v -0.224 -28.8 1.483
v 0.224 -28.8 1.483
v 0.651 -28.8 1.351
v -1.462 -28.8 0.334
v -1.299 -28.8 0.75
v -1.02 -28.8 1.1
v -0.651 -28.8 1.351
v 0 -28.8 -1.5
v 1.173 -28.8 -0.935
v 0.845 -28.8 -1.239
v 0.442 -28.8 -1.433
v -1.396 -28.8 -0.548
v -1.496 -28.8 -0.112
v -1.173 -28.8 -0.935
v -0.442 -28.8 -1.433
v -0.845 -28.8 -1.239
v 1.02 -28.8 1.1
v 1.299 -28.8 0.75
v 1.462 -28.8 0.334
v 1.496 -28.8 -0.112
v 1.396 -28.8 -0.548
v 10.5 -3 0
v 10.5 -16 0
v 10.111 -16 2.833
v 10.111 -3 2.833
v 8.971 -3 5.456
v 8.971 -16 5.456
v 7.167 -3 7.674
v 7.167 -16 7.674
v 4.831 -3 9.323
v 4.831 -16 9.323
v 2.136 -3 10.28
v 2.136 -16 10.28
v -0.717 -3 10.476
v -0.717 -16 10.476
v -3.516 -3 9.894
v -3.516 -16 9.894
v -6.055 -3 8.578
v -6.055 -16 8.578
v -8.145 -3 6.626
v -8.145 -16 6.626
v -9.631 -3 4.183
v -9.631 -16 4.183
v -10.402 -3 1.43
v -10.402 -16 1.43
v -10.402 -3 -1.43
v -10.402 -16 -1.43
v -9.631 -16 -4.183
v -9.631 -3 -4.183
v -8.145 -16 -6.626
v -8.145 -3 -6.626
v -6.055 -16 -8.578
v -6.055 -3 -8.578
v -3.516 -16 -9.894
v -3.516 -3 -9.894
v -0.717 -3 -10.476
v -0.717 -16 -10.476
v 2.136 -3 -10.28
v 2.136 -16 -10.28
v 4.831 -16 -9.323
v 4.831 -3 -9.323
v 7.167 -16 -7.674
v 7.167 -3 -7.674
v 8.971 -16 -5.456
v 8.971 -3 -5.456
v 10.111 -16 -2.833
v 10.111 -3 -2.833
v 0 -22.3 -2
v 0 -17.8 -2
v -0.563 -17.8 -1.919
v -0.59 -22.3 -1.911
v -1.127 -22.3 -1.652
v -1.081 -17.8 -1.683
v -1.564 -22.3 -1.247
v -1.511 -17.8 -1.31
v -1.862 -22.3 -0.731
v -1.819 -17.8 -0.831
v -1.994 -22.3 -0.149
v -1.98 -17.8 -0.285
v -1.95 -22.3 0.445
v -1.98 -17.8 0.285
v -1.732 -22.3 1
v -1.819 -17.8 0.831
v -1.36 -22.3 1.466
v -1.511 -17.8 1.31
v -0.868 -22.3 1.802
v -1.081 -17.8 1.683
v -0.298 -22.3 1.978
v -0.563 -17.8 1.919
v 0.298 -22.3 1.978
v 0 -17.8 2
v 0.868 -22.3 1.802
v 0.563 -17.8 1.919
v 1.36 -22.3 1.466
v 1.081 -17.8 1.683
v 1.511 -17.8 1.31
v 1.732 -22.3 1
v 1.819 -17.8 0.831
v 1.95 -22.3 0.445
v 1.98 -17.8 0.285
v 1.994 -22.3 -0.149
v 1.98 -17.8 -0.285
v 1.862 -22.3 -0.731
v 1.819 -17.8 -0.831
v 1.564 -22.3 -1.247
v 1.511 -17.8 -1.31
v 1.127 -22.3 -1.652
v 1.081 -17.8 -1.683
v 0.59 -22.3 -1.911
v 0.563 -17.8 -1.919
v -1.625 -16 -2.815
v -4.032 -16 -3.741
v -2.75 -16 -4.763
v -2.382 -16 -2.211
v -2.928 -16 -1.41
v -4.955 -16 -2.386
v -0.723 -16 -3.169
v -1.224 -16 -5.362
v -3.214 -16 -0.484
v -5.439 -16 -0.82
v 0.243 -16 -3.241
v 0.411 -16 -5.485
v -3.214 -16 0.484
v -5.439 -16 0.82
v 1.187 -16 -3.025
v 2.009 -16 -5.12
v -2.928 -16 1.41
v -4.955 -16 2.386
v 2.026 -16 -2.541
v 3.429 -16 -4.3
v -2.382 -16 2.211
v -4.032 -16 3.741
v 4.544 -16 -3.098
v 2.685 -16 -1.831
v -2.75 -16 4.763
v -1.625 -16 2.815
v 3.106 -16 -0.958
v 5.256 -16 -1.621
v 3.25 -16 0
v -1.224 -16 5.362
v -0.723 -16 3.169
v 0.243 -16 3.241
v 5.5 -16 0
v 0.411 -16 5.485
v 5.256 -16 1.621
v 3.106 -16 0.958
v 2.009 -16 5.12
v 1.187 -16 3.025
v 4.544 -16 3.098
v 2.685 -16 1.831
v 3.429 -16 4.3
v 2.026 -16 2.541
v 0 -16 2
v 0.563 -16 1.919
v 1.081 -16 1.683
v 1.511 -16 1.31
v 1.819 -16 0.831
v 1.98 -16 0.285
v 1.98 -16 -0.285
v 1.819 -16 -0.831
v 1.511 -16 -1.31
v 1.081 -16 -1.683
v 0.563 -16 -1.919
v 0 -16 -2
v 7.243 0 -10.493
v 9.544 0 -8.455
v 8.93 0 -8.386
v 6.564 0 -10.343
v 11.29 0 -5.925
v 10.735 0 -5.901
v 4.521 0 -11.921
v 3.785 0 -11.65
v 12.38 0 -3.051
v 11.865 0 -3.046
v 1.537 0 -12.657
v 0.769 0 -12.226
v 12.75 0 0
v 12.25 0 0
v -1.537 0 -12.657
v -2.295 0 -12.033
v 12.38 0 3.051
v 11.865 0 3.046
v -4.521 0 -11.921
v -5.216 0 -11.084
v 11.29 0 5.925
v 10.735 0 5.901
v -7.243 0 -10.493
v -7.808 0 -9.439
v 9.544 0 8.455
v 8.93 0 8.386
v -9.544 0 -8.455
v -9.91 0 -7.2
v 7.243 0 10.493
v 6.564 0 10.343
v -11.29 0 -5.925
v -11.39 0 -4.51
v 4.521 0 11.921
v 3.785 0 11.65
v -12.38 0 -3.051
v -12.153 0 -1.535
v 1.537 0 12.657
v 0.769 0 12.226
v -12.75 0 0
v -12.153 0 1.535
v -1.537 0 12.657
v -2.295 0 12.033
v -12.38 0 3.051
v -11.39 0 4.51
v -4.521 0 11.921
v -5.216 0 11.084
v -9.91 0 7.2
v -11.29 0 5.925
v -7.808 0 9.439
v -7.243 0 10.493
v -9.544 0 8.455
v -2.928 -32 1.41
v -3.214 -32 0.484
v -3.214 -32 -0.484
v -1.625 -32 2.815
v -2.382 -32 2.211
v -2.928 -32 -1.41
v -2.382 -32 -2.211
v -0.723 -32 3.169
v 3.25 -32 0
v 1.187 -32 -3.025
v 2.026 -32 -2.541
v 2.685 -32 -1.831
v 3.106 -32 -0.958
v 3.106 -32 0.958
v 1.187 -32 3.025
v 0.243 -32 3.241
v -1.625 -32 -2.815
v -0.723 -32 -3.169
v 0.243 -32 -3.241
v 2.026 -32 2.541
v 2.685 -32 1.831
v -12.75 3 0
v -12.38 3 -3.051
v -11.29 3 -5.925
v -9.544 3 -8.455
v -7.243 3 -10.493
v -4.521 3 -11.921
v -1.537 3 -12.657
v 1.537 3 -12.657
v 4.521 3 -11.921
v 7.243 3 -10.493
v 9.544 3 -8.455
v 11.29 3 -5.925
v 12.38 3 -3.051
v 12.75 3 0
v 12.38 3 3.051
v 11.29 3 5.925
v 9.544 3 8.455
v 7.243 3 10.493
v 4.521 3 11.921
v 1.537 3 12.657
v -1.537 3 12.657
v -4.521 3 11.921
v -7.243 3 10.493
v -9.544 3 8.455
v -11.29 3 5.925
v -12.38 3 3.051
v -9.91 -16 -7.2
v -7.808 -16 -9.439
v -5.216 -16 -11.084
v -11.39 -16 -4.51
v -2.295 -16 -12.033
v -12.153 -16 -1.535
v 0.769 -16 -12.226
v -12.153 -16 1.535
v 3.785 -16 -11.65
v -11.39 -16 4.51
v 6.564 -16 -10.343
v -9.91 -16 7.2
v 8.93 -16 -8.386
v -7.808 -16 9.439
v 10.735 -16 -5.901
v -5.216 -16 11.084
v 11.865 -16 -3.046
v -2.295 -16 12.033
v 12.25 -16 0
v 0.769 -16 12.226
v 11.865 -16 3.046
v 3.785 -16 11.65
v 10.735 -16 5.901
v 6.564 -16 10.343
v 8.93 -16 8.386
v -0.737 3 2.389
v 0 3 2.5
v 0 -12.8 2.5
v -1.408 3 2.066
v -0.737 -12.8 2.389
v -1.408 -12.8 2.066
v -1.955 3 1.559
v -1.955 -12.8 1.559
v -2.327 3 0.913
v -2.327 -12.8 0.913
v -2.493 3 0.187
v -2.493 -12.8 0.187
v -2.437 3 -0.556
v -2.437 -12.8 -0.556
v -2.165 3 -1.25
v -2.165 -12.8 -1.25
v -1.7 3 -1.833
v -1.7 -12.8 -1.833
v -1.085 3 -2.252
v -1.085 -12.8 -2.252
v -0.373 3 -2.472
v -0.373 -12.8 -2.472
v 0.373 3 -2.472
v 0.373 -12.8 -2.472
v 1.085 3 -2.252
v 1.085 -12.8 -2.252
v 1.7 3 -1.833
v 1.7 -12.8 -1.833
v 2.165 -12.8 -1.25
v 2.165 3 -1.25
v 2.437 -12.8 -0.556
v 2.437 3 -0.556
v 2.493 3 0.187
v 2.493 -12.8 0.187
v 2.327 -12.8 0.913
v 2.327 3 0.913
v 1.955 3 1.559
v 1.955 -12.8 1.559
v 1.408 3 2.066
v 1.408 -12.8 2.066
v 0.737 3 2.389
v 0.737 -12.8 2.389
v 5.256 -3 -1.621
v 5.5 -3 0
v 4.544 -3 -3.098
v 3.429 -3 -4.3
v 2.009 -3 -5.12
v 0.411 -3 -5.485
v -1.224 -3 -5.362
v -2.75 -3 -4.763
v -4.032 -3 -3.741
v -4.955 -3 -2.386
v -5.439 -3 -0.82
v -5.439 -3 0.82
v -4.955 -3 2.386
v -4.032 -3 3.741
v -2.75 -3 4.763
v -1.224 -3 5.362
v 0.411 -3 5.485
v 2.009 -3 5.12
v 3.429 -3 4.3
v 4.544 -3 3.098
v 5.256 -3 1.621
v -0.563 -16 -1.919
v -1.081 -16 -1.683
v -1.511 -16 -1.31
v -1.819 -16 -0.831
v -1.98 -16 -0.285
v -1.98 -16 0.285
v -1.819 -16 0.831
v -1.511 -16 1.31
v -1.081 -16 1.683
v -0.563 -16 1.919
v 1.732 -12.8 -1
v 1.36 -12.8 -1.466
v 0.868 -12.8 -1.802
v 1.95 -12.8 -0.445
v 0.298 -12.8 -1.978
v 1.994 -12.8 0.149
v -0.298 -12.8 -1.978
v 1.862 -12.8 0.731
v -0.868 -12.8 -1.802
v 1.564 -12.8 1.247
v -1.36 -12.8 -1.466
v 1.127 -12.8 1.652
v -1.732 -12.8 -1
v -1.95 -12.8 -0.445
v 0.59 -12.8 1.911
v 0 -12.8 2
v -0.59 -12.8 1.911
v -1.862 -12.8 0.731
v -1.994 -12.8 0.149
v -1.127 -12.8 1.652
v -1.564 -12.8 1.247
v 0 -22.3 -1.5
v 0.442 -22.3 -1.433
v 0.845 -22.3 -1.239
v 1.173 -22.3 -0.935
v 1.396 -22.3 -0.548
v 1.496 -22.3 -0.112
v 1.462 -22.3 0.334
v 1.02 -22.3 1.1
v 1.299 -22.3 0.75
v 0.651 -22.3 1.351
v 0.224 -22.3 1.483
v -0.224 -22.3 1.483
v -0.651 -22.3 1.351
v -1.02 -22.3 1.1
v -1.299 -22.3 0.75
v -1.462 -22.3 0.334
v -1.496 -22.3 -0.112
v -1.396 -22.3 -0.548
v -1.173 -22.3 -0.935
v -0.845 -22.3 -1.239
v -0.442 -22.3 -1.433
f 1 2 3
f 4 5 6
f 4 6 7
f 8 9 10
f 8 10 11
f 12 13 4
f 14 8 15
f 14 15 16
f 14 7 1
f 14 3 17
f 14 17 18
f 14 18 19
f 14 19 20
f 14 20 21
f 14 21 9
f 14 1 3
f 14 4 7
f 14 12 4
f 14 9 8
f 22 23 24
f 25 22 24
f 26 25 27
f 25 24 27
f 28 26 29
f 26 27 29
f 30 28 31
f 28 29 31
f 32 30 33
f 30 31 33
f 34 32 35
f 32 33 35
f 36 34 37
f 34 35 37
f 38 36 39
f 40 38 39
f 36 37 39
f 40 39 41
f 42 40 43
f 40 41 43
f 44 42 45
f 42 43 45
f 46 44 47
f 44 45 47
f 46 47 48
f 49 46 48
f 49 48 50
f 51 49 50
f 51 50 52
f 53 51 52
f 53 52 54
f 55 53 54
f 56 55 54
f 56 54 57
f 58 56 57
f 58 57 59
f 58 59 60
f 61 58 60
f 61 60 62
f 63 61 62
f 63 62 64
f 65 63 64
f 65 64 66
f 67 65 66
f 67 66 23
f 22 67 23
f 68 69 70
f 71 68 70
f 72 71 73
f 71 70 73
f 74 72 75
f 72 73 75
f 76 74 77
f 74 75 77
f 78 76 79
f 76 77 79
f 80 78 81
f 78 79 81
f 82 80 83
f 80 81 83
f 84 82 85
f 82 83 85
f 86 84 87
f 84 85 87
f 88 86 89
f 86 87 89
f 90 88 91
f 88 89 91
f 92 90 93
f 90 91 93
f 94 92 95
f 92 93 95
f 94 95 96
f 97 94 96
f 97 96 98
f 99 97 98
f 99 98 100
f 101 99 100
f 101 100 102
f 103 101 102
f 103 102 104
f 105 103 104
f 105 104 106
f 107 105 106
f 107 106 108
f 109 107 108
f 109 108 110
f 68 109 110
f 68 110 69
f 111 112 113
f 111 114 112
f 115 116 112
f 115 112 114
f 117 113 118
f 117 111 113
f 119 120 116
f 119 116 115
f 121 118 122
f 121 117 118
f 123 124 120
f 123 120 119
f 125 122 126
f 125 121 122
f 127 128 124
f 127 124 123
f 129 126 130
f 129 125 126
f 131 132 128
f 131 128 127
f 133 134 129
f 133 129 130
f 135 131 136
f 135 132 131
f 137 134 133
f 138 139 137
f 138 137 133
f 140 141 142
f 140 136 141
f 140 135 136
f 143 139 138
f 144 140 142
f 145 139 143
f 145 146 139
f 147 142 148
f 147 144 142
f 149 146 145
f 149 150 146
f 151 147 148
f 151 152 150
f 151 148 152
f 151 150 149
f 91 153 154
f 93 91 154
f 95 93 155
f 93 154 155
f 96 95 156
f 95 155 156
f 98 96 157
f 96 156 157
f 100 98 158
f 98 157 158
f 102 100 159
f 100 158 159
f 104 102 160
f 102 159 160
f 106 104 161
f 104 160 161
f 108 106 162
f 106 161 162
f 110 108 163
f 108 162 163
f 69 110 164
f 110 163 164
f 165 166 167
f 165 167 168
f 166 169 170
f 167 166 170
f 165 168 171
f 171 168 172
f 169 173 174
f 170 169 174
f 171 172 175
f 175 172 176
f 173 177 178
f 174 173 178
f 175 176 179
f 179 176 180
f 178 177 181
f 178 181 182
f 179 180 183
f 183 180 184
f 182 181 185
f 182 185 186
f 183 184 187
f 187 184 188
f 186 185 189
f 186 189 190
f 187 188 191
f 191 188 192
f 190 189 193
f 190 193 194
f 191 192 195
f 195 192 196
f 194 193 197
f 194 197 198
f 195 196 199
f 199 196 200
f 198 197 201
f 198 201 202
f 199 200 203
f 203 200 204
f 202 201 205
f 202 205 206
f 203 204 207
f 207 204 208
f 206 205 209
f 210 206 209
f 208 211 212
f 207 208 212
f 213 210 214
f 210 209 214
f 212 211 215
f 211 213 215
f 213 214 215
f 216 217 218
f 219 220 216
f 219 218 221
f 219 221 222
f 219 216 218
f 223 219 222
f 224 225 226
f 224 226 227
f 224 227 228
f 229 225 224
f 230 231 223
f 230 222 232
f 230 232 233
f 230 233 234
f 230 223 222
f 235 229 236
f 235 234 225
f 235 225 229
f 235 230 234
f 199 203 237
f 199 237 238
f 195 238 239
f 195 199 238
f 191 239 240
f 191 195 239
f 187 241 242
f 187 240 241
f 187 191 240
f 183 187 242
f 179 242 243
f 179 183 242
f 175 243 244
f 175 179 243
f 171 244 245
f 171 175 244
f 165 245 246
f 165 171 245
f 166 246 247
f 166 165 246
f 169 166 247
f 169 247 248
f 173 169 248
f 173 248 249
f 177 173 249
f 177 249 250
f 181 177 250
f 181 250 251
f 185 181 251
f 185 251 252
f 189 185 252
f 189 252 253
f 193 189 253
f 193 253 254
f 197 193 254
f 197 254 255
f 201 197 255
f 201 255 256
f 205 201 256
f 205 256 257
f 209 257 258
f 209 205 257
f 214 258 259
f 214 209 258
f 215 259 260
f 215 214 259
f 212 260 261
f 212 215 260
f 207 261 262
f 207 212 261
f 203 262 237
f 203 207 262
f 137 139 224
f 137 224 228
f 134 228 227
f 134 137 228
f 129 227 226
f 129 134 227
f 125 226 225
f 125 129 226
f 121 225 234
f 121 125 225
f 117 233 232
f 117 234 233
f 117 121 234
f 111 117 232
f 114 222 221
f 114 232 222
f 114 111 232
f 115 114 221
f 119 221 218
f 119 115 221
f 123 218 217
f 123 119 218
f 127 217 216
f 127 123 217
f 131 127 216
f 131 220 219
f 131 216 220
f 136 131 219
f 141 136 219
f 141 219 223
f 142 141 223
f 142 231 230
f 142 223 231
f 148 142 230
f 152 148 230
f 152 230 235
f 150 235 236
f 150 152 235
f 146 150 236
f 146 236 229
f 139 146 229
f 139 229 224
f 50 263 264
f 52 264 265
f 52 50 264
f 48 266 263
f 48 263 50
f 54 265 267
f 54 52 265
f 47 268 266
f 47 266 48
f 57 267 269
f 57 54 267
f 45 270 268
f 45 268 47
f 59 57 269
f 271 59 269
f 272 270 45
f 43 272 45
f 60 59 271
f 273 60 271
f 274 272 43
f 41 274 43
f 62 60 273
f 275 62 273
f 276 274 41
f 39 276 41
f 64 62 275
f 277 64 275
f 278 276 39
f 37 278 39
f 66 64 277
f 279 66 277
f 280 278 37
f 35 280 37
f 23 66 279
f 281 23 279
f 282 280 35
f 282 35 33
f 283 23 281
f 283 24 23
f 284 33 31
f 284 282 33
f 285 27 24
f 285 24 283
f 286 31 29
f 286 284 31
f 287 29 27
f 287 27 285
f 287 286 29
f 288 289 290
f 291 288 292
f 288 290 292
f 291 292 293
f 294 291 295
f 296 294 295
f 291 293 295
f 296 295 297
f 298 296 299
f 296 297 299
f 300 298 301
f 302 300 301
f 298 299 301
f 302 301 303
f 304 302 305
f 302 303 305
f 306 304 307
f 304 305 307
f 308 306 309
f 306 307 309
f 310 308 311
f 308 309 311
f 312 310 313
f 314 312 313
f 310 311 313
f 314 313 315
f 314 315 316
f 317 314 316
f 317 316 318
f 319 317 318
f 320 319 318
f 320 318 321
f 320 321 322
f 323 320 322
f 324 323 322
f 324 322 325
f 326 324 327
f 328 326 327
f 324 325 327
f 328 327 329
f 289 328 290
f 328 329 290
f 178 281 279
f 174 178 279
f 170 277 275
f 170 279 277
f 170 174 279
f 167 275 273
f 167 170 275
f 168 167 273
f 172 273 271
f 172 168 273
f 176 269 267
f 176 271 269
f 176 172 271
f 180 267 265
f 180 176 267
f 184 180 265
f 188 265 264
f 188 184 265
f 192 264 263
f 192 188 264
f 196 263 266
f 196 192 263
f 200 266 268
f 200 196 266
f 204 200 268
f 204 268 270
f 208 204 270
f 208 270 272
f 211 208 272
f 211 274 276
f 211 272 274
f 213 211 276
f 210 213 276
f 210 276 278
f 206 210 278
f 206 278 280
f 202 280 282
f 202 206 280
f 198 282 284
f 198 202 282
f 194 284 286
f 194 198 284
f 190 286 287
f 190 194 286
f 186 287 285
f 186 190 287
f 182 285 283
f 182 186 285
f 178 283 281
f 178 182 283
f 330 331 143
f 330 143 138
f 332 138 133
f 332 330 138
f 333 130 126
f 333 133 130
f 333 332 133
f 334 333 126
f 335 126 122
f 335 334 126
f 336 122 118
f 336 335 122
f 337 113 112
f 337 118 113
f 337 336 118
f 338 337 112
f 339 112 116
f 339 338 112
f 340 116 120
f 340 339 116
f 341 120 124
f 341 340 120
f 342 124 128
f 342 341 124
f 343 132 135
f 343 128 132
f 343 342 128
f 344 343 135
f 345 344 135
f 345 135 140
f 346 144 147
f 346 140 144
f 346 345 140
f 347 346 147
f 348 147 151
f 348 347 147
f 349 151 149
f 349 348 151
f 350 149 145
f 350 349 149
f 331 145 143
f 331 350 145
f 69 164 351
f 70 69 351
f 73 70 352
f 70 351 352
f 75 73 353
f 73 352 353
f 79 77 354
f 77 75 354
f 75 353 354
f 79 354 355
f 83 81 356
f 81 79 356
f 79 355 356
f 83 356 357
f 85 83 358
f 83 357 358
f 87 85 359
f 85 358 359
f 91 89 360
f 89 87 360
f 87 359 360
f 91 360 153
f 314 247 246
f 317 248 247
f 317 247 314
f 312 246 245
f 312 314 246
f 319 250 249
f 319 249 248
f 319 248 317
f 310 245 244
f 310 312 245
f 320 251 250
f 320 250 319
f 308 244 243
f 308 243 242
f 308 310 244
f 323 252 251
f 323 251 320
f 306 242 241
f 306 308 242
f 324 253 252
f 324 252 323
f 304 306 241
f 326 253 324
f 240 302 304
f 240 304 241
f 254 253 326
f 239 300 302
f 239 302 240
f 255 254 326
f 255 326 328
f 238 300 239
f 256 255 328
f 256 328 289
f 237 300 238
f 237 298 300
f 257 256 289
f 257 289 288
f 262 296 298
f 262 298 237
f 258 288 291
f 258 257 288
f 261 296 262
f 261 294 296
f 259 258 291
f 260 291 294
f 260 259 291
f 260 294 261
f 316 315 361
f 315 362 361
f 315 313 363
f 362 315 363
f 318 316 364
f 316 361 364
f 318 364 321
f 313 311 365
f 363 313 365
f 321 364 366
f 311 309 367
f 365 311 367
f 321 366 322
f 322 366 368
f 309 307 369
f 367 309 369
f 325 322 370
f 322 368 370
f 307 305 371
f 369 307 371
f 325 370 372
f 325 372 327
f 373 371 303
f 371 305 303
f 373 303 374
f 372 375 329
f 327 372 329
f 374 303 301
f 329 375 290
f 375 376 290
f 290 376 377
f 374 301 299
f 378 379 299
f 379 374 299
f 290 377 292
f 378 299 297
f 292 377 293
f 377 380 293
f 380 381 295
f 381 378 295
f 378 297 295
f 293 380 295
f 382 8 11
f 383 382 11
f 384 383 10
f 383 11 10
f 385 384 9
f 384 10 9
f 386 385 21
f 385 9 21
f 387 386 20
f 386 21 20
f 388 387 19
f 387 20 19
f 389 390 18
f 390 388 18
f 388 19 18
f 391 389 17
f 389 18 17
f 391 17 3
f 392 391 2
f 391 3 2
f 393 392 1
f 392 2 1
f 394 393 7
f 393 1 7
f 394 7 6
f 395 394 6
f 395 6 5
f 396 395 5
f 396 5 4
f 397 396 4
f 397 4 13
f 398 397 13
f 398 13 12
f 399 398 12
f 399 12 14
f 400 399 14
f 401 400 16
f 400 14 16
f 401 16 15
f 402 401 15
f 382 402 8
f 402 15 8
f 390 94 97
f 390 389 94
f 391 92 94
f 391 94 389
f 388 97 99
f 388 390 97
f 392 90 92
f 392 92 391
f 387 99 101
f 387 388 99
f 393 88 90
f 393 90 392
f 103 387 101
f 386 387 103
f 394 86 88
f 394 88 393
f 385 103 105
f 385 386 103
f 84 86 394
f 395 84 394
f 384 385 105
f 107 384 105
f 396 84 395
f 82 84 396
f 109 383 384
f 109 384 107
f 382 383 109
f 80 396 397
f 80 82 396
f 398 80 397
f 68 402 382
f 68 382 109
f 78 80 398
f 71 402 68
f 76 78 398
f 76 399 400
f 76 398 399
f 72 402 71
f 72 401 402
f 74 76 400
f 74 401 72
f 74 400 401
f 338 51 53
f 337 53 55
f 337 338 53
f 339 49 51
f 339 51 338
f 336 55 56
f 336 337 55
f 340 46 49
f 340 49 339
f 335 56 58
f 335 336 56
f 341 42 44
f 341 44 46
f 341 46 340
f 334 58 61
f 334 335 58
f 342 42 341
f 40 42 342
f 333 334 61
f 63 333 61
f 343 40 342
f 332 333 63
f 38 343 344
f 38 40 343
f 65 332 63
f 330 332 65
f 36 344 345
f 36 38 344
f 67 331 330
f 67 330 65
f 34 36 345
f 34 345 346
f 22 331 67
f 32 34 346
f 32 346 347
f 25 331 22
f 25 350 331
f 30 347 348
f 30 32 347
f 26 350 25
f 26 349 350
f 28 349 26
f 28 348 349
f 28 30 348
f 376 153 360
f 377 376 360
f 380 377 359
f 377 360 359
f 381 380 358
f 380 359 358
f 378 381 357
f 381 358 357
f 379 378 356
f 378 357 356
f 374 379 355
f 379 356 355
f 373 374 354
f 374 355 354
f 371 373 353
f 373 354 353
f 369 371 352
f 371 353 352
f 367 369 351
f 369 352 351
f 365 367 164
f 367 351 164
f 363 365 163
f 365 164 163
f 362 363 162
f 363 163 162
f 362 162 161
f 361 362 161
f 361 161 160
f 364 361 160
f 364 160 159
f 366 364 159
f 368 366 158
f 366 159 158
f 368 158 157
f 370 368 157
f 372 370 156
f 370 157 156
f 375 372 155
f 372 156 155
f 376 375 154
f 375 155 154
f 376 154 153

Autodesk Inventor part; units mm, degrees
ref_plane "XZ Plane" through (0, 0, 0) normal (0, 1, 0) x (-1, 0, 0)
ref_plane "XY Plane" through (0, 0, 0) normal (0, 0, 1) x (1, 0, 0)
sketch "Skizze1" plane through (0, 0, 0) normal (0, 1, 0) x (-1, 0, 0)
  circle A0 centre (0, 0) radius 12.75
  dimension "d0" = 25.5
extrude "Extrusion1" add sketch "Skizze1" along normal blind 3
sketch "Skizze2" plane through (0, 0, 0) normal (0, -1, 0) x (1, 0, 0)
  circle A0 centre (0, 0) radius 12.25
  dimension "d3" = 24.5
extrude "Extrusion2" add sketch "Skizze2" along normal blind 16
sketch "Skizze6" plane through (0, -16, 0) normal (0, -1, 0) x (1, 0, 0)
  circle A0 centre (0, 0) radius 10.5
  dimension "d20" = 21
extrude "Extrusion5" cut sketch "Skizze6" against normal blind 13
sketch "Skizze7" plane through (0, -3, 0) normal (0, -1, 0) x (1, 0, 0)
  circle A0 centre (0, 0) radius 5.5
  dimension "d23" = 11
extrude "Extrusion6" add sketch "Skizze7" along normal up to surface (13 mm away)
sketch "Skizze8" plane through (0, -16, 0) normal (0, -1, 0) x (1, 0, 0)
  circle A0 centre (0, 0) radius 3.25
  dimension "d26" = 6.5
extrude "Extrusion7" add sketch "Skizze8" along normal blind 16
sketch "Skizze9" plane through (0, 3, 0) normal (0, 1, 0) x (1, 0, 0)
  circle A0 centre (0, 0) radius 12.75 projected
hole "Bohrung2" at (0, 3, 0) direction (0, -1, 0) diameter 5 depth 15.8
ref_plane "Arbeitsebene3" through (0, 0, 0) normal (1, 0, 0) x (0, 1, 0)
sketch "Skizze11" plane through (0, 0, 0) normal (1, 0, 0) x (0, 1, 0)
  line L0 (-16, -3.25) -> (-32, -3.25) projected
  line L1 (-3, -5.5) -> (-16, -5.5) projected
  line L2 (-16, -5.5) -> (-16, 5.5) projected
  line L3 (-3, -10.5) -> (-3, 10.5) projected
  line L4 (-30.7422, 0) -> (0, 0)
  line L5 (-22.3, -2) -> (-12.8, -2)
  line L6 (-12.8, -2.5) -> (-12.8, 2.5) projected
  line L7 (-22.3, -2) -> (-22.3, -1.5)
  line L8 (-22.3, -1.5) -> (-28.8, -1.5)
  line L9 (-28.8, -1.5) -> (-28.8, 0)
  line L10 (-12.8, -2) -> (-12.8, 0)
  point P0 (-22.3, -1.75)
  point P1 (-16, -2)
  point P2 (-16, 0)
  dimension "d38" = 3
  dimension "d39" = 4
  dimension "d40" = 9.5
  dimension "d41" = 6.5
revolve "Umdrehung1" cut sketch "Skizze11" angle 360 about axis through (0, -30.7422, 0) along (0, 1, 0) contours L5 L7 L8 L9 L4 L2
sketch "Skizze14" plane through (0, -12.8, 0) normal (0, 1, 0) x (1, 0, 0)
  point P0 (0, 0)
  point P1 (0, 0)
hole "Bohrung4" at (0, -12.8, 0) direction (0, -1, 0) diameter 4 depth 5
properties part number "18" material "Gold"
